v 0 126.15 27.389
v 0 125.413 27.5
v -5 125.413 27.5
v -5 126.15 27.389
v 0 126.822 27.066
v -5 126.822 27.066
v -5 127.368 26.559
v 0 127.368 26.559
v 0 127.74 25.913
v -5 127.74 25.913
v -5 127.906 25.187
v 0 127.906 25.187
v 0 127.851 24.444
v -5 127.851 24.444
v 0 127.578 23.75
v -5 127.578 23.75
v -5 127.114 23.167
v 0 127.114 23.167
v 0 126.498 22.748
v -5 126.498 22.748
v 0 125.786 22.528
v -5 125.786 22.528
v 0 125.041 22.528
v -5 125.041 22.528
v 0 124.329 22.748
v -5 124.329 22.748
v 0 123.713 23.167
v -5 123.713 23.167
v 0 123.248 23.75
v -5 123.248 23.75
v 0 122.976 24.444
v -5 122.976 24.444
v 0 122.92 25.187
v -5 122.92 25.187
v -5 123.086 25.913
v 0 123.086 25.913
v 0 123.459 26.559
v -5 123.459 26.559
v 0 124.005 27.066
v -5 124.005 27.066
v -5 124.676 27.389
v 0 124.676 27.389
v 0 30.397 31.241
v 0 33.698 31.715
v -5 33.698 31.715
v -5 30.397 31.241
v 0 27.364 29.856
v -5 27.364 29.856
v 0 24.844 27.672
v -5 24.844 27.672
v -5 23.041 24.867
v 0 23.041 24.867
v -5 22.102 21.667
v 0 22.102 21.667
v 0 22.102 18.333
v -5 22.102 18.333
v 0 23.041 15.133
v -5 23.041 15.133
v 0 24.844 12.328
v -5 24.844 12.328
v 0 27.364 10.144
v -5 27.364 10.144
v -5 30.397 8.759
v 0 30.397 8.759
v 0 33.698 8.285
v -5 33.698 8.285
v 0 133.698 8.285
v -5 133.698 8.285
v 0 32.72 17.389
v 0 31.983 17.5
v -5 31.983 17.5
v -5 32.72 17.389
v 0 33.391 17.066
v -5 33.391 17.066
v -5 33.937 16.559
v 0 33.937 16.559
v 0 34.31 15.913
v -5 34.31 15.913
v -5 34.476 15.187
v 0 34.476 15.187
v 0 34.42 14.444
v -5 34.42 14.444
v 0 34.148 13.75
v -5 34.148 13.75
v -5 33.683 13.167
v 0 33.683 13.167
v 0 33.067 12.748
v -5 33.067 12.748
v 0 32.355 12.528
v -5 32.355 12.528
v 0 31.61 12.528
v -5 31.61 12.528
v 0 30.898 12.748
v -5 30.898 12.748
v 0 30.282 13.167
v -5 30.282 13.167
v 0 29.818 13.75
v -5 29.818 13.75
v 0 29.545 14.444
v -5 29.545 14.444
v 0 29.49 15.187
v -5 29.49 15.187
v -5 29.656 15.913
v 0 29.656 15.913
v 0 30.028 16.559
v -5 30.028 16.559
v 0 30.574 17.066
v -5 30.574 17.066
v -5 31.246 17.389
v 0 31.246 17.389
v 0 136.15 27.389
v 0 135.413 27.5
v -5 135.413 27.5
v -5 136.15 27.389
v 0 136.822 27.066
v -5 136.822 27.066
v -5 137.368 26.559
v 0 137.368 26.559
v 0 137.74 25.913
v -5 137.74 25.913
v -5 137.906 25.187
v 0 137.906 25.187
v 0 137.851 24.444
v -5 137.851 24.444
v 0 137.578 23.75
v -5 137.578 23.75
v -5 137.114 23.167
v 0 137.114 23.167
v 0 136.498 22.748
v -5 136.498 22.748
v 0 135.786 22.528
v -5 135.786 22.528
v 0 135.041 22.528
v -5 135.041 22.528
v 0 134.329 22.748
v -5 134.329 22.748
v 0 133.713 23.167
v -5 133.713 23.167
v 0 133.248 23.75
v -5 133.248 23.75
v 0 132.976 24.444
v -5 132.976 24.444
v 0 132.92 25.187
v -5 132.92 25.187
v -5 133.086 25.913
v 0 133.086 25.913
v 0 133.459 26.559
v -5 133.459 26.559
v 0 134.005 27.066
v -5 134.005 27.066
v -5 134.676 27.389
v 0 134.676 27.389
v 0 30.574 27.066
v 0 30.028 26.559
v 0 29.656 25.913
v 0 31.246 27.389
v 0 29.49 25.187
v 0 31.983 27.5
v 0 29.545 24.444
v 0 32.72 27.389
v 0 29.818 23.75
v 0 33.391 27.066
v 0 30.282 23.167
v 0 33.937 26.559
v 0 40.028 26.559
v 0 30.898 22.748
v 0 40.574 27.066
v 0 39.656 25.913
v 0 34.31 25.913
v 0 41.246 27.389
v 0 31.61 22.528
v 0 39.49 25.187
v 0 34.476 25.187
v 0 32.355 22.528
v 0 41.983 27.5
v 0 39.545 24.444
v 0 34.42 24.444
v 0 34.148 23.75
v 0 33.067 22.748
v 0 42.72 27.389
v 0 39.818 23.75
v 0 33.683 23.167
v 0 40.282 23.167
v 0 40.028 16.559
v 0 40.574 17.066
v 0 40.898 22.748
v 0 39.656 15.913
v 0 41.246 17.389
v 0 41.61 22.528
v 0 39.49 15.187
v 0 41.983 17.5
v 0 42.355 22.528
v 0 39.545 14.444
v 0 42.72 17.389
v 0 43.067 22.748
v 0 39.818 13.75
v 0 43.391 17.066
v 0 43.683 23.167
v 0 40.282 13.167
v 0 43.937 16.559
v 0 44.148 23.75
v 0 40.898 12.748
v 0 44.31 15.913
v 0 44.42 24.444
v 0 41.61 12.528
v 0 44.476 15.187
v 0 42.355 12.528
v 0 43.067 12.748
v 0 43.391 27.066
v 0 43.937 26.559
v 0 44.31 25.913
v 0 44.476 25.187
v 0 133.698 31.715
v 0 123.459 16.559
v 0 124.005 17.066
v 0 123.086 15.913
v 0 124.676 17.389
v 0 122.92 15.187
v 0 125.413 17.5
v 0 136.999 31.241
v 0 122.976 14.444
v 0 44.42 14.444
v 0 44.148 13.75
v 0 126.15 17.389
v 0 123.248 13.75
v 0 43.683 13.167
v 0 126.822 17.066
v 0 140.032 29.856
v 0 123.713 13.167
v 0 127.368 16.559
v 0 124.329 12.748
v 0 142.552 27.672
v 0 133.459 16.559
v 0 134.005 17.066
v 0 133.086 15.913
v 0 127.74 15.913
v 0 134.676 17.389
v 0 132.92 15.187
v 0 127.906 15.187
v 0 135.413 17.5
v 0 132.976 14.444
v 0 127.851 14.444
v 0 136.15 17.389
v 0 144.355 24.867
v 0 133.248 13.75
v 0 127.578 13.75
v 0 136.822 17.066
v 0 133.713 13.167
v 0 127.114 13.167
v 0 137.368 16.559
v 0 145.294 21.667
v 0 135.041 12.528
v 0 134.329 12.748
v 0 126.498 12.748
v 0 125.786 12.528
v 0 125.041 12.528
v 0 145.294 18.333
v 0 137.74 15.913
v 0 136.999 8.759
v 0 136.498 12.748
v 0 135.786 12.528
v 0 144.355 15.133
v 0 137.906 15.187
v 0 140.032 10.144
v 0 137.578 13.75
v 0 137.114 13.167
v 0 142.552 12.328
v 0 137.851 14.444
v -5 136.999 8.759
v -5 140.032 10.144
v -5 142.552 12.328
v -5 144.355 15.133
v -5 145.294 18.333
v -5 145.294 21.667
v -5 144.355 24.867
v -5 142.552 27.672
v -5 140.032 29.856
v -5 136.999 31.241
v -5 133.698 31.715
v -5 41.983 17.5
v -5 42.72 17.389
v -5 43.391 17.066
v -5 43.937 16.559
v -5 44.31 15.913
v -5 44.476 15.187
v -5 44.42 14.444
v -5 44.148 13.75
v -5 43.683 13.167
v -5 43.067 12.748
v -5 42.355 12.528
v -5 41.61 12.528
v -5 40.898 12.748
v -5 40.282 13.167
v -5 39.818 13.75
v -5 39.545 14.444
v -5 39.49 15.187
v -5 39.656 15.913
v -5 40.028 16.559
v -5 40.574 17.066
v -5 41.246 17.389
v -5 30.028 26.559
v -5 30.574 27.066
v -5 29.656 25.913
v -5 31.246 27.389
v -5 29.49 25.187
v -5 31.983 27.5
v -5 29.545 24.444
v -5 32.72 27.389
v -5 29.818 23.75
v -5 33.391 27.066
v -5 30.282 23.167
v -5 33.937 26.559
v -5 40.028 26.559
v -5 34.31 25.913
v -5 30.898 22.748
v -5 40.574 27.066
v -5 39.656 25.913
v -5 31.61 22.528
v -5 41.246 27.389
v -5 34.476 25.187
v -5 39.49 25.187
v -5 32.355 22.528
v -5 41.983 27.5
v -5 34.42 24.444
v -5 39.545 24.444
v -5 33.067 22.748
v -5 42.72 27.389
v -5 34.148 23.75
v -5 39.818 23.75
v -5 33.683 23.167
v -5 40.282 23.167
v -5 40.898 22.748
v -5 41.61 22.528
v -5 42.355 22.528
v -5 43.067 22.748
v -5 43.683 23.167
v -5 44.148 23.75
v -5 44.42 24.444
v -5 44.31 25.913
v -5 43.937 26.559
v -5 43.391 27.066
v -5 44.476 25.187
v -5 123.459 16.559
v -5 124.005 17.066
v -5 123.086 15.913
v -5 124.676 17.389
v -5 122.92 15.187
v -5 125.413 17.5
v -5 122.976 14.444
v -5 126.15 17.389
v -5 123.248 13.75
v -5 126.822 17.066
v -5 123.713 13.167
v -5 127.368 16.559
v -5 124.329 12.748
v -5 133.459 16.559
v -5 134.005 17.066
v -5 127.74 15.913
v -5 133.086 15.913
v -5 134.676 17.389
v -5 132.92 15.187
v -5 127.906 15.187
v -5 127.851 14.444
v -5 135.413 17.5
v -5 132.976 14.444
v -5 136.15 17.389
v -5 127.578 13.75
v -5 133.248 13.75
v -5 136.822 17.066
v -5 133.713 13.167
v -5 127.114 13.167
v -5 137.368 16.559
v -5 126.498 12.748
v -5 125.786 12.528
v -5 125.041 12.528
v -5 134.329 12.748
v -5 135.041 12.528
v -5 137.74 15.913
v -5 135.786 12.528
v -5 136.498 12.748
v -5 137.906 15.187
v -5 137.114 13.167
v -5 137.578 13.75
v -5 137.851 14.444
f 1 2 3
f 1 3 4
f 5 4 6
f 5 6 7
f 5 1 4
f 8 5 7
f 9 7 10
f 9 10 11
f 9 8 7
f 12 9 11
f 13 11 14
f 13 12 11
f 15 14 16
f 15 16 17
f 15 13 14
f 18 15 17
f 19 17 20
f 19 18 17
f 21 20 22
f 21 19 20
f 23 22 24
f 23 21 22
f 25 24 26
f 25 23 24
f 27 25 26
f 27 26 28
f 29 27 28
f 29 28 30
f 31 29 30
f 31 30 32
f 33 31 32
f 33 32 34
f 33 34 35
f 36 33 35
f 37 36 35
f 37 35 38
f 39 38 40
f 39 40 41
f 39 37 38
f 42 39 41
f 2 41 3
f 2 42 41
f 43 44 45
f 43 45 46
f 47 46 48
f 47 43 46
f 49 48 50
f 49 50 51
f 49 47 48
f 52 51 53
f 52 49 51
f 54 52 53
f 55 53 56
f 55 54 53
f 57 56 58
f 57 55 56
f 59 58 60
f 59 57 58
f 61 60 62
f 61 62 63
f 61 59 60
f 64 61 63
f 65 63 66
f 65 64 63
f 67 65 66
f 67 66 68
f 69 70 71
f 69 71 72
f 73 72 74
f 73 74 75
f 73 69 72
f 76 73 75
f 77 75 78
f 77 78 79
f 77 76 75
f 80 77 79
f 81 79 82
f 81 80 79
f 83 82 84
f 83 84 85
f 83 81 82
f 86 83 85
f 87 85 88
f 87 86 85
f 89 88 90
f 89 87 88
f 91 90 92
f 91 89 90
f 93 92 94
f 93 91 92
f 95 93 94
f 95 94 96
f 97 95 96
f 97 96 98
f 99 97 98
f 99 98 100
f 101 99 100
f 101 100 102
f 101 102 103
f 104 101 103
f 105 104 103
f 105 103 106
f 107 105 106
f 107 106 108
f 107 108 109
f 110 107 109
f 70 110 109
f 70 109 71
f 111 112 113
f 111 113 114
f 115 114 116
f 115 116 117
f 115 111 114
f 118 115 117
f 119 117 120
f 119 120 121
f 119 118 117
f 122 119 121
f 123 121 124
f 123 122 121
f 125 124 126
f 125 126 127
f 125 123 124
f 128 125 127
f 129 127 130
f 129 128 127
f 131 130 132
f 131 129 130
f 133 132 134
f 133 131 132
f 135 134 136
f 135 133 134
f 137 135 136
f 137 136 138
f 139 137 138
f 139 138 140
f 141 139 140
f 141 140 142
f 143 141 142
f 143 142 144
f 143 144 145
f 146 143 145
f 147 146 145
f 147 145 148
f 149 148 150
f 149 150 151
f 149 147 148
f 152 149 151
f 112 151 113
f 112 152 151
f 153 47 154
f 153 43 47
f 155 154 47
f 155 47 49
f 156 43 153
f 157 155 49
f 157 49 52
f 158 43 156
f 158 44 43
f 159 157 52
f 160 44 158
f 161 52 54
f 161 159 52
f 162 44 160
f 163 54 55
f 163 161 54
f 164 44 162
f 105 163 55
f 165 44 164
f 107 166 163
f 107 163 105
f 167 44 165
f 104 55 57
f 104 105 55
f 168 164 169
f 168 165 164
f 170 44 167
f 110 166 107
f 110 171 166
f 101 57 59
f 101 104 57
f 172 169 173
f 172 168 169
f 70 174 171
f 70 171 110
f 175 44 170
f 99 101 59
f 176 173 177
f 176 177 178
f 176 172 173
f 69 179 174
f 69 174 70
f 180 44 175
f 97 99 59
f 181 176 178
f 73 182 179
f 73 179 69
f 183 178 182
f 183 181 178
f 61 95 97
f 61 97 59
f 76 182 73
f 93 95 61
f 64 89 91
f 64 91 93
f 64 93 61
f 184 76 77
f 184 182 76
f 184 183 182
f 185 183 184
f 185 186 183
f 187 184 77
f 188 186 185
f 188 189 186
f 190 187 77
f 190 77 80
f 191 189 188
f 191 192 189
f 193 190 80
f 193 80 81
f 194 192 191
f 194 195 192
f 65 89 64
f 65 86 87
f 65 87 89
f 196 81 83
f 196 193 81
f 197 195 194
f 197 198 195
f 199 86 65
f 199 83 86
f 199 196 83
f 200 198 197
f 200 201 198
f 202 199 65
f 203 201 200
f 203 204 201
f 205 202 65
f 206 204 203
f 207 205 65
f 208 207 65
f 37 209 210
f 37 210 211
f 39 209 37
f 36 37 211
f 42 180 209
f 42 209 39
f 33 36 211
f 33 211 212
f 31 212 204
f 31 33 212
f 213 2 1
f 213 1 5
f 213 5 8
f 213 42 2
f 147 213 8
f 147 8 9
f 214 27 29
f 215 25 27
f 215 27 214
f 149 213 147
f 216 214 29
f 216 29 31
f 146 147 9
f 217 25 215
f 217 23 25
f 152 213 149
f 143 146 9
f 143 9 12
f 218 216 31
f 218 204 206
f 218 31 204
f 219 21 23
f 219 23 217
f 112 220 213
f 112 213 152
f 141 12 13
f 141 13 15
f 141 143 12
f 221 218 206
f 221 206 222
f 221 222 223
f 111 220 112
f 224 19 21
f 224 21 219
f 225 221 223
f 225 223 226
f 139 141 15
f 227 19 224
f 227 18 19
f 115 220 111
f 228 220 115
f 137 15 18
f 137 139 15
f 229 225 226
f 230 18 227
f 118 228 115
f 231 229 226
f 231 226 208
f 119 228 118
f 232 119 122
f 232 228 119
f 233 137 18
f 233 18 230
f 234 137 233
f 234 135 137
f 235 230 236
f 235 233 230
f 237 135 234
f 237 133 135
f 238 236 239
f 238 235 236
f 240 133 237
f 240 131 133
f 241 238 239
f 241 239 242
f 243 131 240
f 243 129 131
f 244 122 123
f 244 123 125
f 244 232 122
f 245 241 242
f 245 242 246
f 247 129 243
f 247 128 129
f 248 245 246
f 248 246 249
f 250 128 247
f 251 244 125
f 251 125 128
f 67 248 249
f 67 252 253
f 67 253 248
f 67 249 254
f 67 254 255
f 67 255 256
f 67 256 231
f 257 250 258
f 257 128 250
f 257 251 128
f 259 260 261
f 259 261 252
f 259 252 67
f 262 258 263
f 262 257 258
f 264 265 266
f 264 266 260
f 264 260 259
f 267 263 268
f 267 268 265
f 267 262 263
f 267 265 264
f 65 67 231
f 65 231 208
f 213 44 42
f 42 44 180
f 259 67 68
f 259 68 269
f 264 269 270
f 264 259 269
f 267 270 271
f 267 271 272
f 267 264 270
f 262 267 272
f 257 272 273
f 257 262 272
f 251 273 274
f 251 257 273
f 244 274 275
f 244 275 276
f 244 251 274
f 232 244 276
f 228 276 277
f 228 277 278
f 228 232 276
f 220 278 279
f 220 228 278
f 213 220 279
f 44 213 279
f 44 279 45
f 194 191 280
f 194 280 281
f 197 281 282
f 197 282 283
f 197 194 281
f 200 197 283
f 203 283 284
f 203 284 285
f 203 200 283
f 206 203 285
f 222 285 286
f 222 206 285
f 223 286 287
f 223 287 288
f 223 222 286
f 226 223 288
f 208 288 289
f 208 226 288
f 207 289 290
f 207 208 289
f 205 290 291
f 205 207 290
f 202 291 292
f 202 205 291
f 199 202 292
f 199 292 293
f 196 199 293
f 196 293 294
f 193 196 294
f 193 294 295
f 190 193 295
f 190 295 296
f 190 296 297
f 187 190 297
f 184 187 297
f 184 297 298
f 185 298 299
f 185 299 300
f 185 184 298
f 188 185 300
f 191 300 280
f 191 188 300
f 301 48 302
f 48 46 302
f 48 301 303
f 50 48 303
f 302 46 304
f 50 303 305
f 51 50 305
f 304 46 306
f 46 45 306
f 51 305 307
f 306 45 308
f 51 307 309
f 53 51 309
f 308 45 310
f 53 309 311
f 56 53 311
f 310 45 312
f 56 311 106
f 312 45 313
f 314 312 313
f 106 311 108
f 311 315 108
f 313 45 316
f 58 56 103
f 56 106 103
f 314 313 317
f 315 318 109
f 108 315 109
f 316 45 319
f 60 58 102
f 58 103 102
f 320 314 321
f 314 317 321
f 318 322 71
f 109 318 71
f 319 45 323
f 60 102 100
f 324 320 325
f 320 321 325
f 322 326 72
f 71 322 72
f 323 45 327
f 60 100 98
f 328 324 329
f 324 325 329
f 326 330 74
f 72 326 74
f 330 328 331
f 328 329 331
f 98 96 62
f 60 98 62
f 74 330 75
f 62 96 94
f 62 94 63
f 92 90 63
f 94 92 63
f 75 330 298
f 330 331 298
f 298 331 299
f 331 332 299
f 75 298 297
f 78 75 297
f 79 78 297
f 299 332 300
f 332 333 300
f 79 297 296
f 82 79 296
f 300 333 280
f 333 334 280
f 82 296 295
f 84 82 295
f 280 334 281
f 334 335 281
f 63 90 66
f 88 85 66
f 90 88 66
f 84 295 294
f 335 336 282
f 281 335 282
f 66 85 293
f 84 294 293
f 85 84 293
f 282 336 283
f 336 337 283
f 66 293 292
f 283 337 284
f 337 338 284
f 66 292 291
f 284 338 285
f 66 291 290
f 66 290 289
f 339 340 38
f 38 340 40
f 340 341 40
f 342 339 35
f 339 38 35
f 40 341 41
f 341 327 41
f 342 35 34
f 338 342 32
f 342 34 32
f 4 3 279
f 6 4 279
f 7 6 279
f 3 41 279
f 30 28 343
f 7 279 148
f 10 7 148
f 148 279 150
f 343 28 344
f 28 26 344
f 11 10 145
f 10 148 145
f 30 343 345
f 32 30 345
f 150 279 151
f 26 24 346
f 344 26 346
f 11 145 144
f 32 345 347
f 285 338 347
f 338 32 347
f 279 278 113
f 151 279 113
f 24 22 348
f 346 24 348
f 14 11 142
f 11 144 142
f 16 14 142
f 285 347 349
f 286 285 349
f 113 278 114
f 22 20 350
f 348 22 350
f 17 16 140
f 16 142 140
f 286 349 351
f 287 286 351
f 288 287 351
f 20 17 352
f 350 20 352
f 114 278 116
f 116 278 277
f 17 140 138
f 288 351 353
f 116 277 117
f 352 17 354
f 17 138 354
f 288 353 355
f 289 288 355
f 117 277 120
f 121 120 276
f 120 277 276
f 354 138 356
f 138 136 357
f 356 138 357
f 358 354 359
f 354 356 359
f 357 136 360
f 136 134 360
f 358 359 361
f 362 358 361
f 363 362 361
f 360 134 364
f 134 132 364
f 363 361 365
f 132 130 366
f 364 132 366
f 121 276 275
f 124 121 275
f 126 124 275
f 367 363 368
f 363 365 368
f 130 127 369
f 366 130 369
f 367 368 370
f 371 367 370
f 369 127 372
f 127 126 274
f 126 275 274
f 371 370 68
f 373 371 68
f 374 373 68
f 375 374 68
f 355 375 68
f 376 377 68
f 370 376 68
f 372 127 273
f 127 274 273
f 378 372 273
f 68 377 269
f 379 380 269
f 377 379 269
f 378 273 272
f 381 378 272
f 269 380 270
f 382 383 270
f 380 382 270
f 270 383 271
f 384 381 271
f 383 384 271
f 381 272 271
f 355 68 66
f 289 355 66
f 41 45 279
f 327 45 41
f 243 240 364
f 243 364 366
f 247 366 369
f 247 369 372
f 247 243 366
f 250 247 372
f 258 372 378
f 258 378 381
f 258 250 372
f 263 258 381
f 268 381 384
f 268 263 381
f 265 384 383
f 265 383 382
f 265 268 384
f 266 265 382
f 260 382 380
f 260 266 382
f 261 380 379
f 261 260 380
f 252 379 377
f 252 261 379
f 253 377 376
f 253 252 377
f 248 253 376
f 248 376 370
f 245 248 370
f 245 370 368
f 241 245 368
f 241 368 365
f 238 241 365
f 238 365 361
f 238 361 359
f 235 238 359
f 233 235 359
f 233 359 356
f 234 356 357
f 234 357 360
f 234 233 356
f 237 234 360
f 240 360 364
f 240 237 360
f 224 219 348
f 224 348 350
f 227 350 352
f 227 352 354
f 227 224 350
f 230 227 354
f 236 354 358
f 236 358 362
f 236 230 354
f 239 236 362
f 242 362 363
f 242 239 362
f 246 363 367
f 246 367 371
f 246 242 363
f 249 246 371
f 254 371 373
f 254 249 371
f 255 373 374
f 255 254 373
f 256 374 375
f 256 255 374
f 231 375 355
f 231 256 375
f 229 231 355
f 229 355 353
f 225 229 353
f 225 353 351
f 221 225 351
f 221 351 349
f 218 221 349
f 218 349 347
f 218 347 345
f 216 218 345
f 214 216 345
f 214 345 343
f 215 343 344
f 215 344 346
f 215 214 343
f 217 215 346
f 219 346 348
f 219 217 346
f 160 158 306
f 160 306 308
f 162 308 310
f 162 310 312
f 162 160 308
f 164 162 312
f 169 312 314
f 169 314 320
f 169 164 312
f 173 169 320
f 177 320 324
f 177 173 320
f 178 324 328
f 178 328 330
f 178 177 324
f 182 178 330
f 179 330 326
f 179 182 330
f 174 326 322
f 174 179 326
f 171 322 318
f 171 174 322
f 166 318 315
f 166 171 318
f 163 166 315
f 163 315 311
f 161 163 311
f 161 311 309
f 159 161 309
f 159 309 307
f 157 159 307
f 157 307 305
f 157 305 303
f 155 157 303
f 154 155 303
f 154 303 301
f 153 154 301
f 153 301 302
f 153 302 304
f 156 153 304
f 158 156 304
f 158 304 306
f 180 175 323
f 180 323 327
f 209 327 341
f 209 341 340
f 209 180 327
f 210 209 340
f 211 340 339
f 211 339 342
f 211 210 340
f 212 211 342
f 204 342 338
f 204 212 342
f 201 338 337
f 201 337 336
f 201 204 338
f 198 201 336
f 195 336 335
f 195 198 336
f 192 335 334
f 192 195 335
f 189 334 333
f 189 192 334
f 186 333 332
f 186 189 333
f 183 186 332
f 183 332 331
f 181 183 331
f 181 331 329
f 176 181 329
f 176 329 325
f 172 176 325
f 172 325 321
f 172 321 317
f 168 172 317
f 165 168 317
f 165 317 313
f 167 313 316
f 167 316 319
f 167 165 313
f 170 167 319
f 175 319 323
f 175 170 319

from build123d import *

# Parameters (mm, degrees)
RESSALTO_EXTRUS_O1_DEPTH = 40
ESBO_O2_R                = 5
CORTE_EXTRUS_O1_DEPTH    = 51
ESBO_O3_R                = 2.5
RESSALTO_EXTRUS_O2_DEPTH = 5
ESBO_O4_W                = 80.158201918
ESBO_O4_H                = 76.08775654
CORTE_EXTRUS_O2_DEPTH    = 50


with BuildPart() as part:
    # Esboço1 → Ressalto-extrusão1 (new body)
    with BuildSketch(Plane.XY):
        Polygon((0, 0), (0, 50), (10, 50), (10, 10), (40, 10), (40, 50), (50, 50), (50, 0), align=None)
    extrude(amount=RESSALTO_EXTRUS_O1_DEPTH)

    # Esboço2 → Corte-extrusão1 (cut, through all)
    with BuildSketch(Plane.ZY):
        with Locations((20, 33.697961809)):
            Circle(ESBO_O2_R)
    extrude(amount=-CORTE_EXTRUS_O1_DEPTH, mode=Mode.SUBTRACT)

    # Esboço3 → Ressalto-extrusão2 (add)
    with BuildSketch(Plane.ZY):
        with BuildLine():
            Line((8.284737573, 33.697961809), (8.284737573, 133.697961809))
            ThreePointArc((8.284737573, 133.697961809), (20, 145.413224236), (31.715262427, 133.697961809))
            Line((31.715262427, 133.697961809), (31.715262427, 33.697961809))
            ThreePointArc((31.715262427, 33.697961809), (20, 21.982699383), (8.284737573, 33.697961809))
        make_face()
        with Locations((15, 135.413224236)):
            Circle(ESBO_O3_R, mode=Mode.SUBTRACT)
        with Locations((25, 135.413224236)):
            Circle(ESBO_O3_R, mode=Mode.SUBTRACT)
        with Locations((25, 125.413224236)):
            Circle(ESBO_O3_R, mode=Mode.SUBTRACT)
        with Locations((15, 125.413224236)):
            Circle(ESBO_O3_R, mode=Mode.SUBTRACT)
        with Locations((25, 31.982699383)):
            Circle(ESBO_O3_R, mode=Mode.SUBTRACT)
        with Locations((25, 41.982699383)):
            Circle(ESBO_O3_R, mode=Mode.SUBTRACT)
        with Locations((15, 41.982699383)):
            Circle(ESBO_O3_R, mode=Mode.SUBTRACT)
        with Locations((15, 31.982699383)):
            Circle(ESBO_O3_R, mode=Mode.SUBTRACT)
    extrude(amount=RESSALTO_EXTRUS_O2_DEPTH)

    # Esboço4 → Corte-extrusão2 (cut)
    with BuildSketch(Plane(origin=(50, 0, 0), x_dir=(0, 0, -1), z_dir=(1, 0, 0))):
        with Locations((-9.829245476, 29.588761993)):
            Rectangle(ESBO_O4_W, ESBO_O4_H)
    extrude(amount=-CORTE_EXTRUS_O2_DEPTH, mode=Mode.SUBTRACT)


solid = part.part
